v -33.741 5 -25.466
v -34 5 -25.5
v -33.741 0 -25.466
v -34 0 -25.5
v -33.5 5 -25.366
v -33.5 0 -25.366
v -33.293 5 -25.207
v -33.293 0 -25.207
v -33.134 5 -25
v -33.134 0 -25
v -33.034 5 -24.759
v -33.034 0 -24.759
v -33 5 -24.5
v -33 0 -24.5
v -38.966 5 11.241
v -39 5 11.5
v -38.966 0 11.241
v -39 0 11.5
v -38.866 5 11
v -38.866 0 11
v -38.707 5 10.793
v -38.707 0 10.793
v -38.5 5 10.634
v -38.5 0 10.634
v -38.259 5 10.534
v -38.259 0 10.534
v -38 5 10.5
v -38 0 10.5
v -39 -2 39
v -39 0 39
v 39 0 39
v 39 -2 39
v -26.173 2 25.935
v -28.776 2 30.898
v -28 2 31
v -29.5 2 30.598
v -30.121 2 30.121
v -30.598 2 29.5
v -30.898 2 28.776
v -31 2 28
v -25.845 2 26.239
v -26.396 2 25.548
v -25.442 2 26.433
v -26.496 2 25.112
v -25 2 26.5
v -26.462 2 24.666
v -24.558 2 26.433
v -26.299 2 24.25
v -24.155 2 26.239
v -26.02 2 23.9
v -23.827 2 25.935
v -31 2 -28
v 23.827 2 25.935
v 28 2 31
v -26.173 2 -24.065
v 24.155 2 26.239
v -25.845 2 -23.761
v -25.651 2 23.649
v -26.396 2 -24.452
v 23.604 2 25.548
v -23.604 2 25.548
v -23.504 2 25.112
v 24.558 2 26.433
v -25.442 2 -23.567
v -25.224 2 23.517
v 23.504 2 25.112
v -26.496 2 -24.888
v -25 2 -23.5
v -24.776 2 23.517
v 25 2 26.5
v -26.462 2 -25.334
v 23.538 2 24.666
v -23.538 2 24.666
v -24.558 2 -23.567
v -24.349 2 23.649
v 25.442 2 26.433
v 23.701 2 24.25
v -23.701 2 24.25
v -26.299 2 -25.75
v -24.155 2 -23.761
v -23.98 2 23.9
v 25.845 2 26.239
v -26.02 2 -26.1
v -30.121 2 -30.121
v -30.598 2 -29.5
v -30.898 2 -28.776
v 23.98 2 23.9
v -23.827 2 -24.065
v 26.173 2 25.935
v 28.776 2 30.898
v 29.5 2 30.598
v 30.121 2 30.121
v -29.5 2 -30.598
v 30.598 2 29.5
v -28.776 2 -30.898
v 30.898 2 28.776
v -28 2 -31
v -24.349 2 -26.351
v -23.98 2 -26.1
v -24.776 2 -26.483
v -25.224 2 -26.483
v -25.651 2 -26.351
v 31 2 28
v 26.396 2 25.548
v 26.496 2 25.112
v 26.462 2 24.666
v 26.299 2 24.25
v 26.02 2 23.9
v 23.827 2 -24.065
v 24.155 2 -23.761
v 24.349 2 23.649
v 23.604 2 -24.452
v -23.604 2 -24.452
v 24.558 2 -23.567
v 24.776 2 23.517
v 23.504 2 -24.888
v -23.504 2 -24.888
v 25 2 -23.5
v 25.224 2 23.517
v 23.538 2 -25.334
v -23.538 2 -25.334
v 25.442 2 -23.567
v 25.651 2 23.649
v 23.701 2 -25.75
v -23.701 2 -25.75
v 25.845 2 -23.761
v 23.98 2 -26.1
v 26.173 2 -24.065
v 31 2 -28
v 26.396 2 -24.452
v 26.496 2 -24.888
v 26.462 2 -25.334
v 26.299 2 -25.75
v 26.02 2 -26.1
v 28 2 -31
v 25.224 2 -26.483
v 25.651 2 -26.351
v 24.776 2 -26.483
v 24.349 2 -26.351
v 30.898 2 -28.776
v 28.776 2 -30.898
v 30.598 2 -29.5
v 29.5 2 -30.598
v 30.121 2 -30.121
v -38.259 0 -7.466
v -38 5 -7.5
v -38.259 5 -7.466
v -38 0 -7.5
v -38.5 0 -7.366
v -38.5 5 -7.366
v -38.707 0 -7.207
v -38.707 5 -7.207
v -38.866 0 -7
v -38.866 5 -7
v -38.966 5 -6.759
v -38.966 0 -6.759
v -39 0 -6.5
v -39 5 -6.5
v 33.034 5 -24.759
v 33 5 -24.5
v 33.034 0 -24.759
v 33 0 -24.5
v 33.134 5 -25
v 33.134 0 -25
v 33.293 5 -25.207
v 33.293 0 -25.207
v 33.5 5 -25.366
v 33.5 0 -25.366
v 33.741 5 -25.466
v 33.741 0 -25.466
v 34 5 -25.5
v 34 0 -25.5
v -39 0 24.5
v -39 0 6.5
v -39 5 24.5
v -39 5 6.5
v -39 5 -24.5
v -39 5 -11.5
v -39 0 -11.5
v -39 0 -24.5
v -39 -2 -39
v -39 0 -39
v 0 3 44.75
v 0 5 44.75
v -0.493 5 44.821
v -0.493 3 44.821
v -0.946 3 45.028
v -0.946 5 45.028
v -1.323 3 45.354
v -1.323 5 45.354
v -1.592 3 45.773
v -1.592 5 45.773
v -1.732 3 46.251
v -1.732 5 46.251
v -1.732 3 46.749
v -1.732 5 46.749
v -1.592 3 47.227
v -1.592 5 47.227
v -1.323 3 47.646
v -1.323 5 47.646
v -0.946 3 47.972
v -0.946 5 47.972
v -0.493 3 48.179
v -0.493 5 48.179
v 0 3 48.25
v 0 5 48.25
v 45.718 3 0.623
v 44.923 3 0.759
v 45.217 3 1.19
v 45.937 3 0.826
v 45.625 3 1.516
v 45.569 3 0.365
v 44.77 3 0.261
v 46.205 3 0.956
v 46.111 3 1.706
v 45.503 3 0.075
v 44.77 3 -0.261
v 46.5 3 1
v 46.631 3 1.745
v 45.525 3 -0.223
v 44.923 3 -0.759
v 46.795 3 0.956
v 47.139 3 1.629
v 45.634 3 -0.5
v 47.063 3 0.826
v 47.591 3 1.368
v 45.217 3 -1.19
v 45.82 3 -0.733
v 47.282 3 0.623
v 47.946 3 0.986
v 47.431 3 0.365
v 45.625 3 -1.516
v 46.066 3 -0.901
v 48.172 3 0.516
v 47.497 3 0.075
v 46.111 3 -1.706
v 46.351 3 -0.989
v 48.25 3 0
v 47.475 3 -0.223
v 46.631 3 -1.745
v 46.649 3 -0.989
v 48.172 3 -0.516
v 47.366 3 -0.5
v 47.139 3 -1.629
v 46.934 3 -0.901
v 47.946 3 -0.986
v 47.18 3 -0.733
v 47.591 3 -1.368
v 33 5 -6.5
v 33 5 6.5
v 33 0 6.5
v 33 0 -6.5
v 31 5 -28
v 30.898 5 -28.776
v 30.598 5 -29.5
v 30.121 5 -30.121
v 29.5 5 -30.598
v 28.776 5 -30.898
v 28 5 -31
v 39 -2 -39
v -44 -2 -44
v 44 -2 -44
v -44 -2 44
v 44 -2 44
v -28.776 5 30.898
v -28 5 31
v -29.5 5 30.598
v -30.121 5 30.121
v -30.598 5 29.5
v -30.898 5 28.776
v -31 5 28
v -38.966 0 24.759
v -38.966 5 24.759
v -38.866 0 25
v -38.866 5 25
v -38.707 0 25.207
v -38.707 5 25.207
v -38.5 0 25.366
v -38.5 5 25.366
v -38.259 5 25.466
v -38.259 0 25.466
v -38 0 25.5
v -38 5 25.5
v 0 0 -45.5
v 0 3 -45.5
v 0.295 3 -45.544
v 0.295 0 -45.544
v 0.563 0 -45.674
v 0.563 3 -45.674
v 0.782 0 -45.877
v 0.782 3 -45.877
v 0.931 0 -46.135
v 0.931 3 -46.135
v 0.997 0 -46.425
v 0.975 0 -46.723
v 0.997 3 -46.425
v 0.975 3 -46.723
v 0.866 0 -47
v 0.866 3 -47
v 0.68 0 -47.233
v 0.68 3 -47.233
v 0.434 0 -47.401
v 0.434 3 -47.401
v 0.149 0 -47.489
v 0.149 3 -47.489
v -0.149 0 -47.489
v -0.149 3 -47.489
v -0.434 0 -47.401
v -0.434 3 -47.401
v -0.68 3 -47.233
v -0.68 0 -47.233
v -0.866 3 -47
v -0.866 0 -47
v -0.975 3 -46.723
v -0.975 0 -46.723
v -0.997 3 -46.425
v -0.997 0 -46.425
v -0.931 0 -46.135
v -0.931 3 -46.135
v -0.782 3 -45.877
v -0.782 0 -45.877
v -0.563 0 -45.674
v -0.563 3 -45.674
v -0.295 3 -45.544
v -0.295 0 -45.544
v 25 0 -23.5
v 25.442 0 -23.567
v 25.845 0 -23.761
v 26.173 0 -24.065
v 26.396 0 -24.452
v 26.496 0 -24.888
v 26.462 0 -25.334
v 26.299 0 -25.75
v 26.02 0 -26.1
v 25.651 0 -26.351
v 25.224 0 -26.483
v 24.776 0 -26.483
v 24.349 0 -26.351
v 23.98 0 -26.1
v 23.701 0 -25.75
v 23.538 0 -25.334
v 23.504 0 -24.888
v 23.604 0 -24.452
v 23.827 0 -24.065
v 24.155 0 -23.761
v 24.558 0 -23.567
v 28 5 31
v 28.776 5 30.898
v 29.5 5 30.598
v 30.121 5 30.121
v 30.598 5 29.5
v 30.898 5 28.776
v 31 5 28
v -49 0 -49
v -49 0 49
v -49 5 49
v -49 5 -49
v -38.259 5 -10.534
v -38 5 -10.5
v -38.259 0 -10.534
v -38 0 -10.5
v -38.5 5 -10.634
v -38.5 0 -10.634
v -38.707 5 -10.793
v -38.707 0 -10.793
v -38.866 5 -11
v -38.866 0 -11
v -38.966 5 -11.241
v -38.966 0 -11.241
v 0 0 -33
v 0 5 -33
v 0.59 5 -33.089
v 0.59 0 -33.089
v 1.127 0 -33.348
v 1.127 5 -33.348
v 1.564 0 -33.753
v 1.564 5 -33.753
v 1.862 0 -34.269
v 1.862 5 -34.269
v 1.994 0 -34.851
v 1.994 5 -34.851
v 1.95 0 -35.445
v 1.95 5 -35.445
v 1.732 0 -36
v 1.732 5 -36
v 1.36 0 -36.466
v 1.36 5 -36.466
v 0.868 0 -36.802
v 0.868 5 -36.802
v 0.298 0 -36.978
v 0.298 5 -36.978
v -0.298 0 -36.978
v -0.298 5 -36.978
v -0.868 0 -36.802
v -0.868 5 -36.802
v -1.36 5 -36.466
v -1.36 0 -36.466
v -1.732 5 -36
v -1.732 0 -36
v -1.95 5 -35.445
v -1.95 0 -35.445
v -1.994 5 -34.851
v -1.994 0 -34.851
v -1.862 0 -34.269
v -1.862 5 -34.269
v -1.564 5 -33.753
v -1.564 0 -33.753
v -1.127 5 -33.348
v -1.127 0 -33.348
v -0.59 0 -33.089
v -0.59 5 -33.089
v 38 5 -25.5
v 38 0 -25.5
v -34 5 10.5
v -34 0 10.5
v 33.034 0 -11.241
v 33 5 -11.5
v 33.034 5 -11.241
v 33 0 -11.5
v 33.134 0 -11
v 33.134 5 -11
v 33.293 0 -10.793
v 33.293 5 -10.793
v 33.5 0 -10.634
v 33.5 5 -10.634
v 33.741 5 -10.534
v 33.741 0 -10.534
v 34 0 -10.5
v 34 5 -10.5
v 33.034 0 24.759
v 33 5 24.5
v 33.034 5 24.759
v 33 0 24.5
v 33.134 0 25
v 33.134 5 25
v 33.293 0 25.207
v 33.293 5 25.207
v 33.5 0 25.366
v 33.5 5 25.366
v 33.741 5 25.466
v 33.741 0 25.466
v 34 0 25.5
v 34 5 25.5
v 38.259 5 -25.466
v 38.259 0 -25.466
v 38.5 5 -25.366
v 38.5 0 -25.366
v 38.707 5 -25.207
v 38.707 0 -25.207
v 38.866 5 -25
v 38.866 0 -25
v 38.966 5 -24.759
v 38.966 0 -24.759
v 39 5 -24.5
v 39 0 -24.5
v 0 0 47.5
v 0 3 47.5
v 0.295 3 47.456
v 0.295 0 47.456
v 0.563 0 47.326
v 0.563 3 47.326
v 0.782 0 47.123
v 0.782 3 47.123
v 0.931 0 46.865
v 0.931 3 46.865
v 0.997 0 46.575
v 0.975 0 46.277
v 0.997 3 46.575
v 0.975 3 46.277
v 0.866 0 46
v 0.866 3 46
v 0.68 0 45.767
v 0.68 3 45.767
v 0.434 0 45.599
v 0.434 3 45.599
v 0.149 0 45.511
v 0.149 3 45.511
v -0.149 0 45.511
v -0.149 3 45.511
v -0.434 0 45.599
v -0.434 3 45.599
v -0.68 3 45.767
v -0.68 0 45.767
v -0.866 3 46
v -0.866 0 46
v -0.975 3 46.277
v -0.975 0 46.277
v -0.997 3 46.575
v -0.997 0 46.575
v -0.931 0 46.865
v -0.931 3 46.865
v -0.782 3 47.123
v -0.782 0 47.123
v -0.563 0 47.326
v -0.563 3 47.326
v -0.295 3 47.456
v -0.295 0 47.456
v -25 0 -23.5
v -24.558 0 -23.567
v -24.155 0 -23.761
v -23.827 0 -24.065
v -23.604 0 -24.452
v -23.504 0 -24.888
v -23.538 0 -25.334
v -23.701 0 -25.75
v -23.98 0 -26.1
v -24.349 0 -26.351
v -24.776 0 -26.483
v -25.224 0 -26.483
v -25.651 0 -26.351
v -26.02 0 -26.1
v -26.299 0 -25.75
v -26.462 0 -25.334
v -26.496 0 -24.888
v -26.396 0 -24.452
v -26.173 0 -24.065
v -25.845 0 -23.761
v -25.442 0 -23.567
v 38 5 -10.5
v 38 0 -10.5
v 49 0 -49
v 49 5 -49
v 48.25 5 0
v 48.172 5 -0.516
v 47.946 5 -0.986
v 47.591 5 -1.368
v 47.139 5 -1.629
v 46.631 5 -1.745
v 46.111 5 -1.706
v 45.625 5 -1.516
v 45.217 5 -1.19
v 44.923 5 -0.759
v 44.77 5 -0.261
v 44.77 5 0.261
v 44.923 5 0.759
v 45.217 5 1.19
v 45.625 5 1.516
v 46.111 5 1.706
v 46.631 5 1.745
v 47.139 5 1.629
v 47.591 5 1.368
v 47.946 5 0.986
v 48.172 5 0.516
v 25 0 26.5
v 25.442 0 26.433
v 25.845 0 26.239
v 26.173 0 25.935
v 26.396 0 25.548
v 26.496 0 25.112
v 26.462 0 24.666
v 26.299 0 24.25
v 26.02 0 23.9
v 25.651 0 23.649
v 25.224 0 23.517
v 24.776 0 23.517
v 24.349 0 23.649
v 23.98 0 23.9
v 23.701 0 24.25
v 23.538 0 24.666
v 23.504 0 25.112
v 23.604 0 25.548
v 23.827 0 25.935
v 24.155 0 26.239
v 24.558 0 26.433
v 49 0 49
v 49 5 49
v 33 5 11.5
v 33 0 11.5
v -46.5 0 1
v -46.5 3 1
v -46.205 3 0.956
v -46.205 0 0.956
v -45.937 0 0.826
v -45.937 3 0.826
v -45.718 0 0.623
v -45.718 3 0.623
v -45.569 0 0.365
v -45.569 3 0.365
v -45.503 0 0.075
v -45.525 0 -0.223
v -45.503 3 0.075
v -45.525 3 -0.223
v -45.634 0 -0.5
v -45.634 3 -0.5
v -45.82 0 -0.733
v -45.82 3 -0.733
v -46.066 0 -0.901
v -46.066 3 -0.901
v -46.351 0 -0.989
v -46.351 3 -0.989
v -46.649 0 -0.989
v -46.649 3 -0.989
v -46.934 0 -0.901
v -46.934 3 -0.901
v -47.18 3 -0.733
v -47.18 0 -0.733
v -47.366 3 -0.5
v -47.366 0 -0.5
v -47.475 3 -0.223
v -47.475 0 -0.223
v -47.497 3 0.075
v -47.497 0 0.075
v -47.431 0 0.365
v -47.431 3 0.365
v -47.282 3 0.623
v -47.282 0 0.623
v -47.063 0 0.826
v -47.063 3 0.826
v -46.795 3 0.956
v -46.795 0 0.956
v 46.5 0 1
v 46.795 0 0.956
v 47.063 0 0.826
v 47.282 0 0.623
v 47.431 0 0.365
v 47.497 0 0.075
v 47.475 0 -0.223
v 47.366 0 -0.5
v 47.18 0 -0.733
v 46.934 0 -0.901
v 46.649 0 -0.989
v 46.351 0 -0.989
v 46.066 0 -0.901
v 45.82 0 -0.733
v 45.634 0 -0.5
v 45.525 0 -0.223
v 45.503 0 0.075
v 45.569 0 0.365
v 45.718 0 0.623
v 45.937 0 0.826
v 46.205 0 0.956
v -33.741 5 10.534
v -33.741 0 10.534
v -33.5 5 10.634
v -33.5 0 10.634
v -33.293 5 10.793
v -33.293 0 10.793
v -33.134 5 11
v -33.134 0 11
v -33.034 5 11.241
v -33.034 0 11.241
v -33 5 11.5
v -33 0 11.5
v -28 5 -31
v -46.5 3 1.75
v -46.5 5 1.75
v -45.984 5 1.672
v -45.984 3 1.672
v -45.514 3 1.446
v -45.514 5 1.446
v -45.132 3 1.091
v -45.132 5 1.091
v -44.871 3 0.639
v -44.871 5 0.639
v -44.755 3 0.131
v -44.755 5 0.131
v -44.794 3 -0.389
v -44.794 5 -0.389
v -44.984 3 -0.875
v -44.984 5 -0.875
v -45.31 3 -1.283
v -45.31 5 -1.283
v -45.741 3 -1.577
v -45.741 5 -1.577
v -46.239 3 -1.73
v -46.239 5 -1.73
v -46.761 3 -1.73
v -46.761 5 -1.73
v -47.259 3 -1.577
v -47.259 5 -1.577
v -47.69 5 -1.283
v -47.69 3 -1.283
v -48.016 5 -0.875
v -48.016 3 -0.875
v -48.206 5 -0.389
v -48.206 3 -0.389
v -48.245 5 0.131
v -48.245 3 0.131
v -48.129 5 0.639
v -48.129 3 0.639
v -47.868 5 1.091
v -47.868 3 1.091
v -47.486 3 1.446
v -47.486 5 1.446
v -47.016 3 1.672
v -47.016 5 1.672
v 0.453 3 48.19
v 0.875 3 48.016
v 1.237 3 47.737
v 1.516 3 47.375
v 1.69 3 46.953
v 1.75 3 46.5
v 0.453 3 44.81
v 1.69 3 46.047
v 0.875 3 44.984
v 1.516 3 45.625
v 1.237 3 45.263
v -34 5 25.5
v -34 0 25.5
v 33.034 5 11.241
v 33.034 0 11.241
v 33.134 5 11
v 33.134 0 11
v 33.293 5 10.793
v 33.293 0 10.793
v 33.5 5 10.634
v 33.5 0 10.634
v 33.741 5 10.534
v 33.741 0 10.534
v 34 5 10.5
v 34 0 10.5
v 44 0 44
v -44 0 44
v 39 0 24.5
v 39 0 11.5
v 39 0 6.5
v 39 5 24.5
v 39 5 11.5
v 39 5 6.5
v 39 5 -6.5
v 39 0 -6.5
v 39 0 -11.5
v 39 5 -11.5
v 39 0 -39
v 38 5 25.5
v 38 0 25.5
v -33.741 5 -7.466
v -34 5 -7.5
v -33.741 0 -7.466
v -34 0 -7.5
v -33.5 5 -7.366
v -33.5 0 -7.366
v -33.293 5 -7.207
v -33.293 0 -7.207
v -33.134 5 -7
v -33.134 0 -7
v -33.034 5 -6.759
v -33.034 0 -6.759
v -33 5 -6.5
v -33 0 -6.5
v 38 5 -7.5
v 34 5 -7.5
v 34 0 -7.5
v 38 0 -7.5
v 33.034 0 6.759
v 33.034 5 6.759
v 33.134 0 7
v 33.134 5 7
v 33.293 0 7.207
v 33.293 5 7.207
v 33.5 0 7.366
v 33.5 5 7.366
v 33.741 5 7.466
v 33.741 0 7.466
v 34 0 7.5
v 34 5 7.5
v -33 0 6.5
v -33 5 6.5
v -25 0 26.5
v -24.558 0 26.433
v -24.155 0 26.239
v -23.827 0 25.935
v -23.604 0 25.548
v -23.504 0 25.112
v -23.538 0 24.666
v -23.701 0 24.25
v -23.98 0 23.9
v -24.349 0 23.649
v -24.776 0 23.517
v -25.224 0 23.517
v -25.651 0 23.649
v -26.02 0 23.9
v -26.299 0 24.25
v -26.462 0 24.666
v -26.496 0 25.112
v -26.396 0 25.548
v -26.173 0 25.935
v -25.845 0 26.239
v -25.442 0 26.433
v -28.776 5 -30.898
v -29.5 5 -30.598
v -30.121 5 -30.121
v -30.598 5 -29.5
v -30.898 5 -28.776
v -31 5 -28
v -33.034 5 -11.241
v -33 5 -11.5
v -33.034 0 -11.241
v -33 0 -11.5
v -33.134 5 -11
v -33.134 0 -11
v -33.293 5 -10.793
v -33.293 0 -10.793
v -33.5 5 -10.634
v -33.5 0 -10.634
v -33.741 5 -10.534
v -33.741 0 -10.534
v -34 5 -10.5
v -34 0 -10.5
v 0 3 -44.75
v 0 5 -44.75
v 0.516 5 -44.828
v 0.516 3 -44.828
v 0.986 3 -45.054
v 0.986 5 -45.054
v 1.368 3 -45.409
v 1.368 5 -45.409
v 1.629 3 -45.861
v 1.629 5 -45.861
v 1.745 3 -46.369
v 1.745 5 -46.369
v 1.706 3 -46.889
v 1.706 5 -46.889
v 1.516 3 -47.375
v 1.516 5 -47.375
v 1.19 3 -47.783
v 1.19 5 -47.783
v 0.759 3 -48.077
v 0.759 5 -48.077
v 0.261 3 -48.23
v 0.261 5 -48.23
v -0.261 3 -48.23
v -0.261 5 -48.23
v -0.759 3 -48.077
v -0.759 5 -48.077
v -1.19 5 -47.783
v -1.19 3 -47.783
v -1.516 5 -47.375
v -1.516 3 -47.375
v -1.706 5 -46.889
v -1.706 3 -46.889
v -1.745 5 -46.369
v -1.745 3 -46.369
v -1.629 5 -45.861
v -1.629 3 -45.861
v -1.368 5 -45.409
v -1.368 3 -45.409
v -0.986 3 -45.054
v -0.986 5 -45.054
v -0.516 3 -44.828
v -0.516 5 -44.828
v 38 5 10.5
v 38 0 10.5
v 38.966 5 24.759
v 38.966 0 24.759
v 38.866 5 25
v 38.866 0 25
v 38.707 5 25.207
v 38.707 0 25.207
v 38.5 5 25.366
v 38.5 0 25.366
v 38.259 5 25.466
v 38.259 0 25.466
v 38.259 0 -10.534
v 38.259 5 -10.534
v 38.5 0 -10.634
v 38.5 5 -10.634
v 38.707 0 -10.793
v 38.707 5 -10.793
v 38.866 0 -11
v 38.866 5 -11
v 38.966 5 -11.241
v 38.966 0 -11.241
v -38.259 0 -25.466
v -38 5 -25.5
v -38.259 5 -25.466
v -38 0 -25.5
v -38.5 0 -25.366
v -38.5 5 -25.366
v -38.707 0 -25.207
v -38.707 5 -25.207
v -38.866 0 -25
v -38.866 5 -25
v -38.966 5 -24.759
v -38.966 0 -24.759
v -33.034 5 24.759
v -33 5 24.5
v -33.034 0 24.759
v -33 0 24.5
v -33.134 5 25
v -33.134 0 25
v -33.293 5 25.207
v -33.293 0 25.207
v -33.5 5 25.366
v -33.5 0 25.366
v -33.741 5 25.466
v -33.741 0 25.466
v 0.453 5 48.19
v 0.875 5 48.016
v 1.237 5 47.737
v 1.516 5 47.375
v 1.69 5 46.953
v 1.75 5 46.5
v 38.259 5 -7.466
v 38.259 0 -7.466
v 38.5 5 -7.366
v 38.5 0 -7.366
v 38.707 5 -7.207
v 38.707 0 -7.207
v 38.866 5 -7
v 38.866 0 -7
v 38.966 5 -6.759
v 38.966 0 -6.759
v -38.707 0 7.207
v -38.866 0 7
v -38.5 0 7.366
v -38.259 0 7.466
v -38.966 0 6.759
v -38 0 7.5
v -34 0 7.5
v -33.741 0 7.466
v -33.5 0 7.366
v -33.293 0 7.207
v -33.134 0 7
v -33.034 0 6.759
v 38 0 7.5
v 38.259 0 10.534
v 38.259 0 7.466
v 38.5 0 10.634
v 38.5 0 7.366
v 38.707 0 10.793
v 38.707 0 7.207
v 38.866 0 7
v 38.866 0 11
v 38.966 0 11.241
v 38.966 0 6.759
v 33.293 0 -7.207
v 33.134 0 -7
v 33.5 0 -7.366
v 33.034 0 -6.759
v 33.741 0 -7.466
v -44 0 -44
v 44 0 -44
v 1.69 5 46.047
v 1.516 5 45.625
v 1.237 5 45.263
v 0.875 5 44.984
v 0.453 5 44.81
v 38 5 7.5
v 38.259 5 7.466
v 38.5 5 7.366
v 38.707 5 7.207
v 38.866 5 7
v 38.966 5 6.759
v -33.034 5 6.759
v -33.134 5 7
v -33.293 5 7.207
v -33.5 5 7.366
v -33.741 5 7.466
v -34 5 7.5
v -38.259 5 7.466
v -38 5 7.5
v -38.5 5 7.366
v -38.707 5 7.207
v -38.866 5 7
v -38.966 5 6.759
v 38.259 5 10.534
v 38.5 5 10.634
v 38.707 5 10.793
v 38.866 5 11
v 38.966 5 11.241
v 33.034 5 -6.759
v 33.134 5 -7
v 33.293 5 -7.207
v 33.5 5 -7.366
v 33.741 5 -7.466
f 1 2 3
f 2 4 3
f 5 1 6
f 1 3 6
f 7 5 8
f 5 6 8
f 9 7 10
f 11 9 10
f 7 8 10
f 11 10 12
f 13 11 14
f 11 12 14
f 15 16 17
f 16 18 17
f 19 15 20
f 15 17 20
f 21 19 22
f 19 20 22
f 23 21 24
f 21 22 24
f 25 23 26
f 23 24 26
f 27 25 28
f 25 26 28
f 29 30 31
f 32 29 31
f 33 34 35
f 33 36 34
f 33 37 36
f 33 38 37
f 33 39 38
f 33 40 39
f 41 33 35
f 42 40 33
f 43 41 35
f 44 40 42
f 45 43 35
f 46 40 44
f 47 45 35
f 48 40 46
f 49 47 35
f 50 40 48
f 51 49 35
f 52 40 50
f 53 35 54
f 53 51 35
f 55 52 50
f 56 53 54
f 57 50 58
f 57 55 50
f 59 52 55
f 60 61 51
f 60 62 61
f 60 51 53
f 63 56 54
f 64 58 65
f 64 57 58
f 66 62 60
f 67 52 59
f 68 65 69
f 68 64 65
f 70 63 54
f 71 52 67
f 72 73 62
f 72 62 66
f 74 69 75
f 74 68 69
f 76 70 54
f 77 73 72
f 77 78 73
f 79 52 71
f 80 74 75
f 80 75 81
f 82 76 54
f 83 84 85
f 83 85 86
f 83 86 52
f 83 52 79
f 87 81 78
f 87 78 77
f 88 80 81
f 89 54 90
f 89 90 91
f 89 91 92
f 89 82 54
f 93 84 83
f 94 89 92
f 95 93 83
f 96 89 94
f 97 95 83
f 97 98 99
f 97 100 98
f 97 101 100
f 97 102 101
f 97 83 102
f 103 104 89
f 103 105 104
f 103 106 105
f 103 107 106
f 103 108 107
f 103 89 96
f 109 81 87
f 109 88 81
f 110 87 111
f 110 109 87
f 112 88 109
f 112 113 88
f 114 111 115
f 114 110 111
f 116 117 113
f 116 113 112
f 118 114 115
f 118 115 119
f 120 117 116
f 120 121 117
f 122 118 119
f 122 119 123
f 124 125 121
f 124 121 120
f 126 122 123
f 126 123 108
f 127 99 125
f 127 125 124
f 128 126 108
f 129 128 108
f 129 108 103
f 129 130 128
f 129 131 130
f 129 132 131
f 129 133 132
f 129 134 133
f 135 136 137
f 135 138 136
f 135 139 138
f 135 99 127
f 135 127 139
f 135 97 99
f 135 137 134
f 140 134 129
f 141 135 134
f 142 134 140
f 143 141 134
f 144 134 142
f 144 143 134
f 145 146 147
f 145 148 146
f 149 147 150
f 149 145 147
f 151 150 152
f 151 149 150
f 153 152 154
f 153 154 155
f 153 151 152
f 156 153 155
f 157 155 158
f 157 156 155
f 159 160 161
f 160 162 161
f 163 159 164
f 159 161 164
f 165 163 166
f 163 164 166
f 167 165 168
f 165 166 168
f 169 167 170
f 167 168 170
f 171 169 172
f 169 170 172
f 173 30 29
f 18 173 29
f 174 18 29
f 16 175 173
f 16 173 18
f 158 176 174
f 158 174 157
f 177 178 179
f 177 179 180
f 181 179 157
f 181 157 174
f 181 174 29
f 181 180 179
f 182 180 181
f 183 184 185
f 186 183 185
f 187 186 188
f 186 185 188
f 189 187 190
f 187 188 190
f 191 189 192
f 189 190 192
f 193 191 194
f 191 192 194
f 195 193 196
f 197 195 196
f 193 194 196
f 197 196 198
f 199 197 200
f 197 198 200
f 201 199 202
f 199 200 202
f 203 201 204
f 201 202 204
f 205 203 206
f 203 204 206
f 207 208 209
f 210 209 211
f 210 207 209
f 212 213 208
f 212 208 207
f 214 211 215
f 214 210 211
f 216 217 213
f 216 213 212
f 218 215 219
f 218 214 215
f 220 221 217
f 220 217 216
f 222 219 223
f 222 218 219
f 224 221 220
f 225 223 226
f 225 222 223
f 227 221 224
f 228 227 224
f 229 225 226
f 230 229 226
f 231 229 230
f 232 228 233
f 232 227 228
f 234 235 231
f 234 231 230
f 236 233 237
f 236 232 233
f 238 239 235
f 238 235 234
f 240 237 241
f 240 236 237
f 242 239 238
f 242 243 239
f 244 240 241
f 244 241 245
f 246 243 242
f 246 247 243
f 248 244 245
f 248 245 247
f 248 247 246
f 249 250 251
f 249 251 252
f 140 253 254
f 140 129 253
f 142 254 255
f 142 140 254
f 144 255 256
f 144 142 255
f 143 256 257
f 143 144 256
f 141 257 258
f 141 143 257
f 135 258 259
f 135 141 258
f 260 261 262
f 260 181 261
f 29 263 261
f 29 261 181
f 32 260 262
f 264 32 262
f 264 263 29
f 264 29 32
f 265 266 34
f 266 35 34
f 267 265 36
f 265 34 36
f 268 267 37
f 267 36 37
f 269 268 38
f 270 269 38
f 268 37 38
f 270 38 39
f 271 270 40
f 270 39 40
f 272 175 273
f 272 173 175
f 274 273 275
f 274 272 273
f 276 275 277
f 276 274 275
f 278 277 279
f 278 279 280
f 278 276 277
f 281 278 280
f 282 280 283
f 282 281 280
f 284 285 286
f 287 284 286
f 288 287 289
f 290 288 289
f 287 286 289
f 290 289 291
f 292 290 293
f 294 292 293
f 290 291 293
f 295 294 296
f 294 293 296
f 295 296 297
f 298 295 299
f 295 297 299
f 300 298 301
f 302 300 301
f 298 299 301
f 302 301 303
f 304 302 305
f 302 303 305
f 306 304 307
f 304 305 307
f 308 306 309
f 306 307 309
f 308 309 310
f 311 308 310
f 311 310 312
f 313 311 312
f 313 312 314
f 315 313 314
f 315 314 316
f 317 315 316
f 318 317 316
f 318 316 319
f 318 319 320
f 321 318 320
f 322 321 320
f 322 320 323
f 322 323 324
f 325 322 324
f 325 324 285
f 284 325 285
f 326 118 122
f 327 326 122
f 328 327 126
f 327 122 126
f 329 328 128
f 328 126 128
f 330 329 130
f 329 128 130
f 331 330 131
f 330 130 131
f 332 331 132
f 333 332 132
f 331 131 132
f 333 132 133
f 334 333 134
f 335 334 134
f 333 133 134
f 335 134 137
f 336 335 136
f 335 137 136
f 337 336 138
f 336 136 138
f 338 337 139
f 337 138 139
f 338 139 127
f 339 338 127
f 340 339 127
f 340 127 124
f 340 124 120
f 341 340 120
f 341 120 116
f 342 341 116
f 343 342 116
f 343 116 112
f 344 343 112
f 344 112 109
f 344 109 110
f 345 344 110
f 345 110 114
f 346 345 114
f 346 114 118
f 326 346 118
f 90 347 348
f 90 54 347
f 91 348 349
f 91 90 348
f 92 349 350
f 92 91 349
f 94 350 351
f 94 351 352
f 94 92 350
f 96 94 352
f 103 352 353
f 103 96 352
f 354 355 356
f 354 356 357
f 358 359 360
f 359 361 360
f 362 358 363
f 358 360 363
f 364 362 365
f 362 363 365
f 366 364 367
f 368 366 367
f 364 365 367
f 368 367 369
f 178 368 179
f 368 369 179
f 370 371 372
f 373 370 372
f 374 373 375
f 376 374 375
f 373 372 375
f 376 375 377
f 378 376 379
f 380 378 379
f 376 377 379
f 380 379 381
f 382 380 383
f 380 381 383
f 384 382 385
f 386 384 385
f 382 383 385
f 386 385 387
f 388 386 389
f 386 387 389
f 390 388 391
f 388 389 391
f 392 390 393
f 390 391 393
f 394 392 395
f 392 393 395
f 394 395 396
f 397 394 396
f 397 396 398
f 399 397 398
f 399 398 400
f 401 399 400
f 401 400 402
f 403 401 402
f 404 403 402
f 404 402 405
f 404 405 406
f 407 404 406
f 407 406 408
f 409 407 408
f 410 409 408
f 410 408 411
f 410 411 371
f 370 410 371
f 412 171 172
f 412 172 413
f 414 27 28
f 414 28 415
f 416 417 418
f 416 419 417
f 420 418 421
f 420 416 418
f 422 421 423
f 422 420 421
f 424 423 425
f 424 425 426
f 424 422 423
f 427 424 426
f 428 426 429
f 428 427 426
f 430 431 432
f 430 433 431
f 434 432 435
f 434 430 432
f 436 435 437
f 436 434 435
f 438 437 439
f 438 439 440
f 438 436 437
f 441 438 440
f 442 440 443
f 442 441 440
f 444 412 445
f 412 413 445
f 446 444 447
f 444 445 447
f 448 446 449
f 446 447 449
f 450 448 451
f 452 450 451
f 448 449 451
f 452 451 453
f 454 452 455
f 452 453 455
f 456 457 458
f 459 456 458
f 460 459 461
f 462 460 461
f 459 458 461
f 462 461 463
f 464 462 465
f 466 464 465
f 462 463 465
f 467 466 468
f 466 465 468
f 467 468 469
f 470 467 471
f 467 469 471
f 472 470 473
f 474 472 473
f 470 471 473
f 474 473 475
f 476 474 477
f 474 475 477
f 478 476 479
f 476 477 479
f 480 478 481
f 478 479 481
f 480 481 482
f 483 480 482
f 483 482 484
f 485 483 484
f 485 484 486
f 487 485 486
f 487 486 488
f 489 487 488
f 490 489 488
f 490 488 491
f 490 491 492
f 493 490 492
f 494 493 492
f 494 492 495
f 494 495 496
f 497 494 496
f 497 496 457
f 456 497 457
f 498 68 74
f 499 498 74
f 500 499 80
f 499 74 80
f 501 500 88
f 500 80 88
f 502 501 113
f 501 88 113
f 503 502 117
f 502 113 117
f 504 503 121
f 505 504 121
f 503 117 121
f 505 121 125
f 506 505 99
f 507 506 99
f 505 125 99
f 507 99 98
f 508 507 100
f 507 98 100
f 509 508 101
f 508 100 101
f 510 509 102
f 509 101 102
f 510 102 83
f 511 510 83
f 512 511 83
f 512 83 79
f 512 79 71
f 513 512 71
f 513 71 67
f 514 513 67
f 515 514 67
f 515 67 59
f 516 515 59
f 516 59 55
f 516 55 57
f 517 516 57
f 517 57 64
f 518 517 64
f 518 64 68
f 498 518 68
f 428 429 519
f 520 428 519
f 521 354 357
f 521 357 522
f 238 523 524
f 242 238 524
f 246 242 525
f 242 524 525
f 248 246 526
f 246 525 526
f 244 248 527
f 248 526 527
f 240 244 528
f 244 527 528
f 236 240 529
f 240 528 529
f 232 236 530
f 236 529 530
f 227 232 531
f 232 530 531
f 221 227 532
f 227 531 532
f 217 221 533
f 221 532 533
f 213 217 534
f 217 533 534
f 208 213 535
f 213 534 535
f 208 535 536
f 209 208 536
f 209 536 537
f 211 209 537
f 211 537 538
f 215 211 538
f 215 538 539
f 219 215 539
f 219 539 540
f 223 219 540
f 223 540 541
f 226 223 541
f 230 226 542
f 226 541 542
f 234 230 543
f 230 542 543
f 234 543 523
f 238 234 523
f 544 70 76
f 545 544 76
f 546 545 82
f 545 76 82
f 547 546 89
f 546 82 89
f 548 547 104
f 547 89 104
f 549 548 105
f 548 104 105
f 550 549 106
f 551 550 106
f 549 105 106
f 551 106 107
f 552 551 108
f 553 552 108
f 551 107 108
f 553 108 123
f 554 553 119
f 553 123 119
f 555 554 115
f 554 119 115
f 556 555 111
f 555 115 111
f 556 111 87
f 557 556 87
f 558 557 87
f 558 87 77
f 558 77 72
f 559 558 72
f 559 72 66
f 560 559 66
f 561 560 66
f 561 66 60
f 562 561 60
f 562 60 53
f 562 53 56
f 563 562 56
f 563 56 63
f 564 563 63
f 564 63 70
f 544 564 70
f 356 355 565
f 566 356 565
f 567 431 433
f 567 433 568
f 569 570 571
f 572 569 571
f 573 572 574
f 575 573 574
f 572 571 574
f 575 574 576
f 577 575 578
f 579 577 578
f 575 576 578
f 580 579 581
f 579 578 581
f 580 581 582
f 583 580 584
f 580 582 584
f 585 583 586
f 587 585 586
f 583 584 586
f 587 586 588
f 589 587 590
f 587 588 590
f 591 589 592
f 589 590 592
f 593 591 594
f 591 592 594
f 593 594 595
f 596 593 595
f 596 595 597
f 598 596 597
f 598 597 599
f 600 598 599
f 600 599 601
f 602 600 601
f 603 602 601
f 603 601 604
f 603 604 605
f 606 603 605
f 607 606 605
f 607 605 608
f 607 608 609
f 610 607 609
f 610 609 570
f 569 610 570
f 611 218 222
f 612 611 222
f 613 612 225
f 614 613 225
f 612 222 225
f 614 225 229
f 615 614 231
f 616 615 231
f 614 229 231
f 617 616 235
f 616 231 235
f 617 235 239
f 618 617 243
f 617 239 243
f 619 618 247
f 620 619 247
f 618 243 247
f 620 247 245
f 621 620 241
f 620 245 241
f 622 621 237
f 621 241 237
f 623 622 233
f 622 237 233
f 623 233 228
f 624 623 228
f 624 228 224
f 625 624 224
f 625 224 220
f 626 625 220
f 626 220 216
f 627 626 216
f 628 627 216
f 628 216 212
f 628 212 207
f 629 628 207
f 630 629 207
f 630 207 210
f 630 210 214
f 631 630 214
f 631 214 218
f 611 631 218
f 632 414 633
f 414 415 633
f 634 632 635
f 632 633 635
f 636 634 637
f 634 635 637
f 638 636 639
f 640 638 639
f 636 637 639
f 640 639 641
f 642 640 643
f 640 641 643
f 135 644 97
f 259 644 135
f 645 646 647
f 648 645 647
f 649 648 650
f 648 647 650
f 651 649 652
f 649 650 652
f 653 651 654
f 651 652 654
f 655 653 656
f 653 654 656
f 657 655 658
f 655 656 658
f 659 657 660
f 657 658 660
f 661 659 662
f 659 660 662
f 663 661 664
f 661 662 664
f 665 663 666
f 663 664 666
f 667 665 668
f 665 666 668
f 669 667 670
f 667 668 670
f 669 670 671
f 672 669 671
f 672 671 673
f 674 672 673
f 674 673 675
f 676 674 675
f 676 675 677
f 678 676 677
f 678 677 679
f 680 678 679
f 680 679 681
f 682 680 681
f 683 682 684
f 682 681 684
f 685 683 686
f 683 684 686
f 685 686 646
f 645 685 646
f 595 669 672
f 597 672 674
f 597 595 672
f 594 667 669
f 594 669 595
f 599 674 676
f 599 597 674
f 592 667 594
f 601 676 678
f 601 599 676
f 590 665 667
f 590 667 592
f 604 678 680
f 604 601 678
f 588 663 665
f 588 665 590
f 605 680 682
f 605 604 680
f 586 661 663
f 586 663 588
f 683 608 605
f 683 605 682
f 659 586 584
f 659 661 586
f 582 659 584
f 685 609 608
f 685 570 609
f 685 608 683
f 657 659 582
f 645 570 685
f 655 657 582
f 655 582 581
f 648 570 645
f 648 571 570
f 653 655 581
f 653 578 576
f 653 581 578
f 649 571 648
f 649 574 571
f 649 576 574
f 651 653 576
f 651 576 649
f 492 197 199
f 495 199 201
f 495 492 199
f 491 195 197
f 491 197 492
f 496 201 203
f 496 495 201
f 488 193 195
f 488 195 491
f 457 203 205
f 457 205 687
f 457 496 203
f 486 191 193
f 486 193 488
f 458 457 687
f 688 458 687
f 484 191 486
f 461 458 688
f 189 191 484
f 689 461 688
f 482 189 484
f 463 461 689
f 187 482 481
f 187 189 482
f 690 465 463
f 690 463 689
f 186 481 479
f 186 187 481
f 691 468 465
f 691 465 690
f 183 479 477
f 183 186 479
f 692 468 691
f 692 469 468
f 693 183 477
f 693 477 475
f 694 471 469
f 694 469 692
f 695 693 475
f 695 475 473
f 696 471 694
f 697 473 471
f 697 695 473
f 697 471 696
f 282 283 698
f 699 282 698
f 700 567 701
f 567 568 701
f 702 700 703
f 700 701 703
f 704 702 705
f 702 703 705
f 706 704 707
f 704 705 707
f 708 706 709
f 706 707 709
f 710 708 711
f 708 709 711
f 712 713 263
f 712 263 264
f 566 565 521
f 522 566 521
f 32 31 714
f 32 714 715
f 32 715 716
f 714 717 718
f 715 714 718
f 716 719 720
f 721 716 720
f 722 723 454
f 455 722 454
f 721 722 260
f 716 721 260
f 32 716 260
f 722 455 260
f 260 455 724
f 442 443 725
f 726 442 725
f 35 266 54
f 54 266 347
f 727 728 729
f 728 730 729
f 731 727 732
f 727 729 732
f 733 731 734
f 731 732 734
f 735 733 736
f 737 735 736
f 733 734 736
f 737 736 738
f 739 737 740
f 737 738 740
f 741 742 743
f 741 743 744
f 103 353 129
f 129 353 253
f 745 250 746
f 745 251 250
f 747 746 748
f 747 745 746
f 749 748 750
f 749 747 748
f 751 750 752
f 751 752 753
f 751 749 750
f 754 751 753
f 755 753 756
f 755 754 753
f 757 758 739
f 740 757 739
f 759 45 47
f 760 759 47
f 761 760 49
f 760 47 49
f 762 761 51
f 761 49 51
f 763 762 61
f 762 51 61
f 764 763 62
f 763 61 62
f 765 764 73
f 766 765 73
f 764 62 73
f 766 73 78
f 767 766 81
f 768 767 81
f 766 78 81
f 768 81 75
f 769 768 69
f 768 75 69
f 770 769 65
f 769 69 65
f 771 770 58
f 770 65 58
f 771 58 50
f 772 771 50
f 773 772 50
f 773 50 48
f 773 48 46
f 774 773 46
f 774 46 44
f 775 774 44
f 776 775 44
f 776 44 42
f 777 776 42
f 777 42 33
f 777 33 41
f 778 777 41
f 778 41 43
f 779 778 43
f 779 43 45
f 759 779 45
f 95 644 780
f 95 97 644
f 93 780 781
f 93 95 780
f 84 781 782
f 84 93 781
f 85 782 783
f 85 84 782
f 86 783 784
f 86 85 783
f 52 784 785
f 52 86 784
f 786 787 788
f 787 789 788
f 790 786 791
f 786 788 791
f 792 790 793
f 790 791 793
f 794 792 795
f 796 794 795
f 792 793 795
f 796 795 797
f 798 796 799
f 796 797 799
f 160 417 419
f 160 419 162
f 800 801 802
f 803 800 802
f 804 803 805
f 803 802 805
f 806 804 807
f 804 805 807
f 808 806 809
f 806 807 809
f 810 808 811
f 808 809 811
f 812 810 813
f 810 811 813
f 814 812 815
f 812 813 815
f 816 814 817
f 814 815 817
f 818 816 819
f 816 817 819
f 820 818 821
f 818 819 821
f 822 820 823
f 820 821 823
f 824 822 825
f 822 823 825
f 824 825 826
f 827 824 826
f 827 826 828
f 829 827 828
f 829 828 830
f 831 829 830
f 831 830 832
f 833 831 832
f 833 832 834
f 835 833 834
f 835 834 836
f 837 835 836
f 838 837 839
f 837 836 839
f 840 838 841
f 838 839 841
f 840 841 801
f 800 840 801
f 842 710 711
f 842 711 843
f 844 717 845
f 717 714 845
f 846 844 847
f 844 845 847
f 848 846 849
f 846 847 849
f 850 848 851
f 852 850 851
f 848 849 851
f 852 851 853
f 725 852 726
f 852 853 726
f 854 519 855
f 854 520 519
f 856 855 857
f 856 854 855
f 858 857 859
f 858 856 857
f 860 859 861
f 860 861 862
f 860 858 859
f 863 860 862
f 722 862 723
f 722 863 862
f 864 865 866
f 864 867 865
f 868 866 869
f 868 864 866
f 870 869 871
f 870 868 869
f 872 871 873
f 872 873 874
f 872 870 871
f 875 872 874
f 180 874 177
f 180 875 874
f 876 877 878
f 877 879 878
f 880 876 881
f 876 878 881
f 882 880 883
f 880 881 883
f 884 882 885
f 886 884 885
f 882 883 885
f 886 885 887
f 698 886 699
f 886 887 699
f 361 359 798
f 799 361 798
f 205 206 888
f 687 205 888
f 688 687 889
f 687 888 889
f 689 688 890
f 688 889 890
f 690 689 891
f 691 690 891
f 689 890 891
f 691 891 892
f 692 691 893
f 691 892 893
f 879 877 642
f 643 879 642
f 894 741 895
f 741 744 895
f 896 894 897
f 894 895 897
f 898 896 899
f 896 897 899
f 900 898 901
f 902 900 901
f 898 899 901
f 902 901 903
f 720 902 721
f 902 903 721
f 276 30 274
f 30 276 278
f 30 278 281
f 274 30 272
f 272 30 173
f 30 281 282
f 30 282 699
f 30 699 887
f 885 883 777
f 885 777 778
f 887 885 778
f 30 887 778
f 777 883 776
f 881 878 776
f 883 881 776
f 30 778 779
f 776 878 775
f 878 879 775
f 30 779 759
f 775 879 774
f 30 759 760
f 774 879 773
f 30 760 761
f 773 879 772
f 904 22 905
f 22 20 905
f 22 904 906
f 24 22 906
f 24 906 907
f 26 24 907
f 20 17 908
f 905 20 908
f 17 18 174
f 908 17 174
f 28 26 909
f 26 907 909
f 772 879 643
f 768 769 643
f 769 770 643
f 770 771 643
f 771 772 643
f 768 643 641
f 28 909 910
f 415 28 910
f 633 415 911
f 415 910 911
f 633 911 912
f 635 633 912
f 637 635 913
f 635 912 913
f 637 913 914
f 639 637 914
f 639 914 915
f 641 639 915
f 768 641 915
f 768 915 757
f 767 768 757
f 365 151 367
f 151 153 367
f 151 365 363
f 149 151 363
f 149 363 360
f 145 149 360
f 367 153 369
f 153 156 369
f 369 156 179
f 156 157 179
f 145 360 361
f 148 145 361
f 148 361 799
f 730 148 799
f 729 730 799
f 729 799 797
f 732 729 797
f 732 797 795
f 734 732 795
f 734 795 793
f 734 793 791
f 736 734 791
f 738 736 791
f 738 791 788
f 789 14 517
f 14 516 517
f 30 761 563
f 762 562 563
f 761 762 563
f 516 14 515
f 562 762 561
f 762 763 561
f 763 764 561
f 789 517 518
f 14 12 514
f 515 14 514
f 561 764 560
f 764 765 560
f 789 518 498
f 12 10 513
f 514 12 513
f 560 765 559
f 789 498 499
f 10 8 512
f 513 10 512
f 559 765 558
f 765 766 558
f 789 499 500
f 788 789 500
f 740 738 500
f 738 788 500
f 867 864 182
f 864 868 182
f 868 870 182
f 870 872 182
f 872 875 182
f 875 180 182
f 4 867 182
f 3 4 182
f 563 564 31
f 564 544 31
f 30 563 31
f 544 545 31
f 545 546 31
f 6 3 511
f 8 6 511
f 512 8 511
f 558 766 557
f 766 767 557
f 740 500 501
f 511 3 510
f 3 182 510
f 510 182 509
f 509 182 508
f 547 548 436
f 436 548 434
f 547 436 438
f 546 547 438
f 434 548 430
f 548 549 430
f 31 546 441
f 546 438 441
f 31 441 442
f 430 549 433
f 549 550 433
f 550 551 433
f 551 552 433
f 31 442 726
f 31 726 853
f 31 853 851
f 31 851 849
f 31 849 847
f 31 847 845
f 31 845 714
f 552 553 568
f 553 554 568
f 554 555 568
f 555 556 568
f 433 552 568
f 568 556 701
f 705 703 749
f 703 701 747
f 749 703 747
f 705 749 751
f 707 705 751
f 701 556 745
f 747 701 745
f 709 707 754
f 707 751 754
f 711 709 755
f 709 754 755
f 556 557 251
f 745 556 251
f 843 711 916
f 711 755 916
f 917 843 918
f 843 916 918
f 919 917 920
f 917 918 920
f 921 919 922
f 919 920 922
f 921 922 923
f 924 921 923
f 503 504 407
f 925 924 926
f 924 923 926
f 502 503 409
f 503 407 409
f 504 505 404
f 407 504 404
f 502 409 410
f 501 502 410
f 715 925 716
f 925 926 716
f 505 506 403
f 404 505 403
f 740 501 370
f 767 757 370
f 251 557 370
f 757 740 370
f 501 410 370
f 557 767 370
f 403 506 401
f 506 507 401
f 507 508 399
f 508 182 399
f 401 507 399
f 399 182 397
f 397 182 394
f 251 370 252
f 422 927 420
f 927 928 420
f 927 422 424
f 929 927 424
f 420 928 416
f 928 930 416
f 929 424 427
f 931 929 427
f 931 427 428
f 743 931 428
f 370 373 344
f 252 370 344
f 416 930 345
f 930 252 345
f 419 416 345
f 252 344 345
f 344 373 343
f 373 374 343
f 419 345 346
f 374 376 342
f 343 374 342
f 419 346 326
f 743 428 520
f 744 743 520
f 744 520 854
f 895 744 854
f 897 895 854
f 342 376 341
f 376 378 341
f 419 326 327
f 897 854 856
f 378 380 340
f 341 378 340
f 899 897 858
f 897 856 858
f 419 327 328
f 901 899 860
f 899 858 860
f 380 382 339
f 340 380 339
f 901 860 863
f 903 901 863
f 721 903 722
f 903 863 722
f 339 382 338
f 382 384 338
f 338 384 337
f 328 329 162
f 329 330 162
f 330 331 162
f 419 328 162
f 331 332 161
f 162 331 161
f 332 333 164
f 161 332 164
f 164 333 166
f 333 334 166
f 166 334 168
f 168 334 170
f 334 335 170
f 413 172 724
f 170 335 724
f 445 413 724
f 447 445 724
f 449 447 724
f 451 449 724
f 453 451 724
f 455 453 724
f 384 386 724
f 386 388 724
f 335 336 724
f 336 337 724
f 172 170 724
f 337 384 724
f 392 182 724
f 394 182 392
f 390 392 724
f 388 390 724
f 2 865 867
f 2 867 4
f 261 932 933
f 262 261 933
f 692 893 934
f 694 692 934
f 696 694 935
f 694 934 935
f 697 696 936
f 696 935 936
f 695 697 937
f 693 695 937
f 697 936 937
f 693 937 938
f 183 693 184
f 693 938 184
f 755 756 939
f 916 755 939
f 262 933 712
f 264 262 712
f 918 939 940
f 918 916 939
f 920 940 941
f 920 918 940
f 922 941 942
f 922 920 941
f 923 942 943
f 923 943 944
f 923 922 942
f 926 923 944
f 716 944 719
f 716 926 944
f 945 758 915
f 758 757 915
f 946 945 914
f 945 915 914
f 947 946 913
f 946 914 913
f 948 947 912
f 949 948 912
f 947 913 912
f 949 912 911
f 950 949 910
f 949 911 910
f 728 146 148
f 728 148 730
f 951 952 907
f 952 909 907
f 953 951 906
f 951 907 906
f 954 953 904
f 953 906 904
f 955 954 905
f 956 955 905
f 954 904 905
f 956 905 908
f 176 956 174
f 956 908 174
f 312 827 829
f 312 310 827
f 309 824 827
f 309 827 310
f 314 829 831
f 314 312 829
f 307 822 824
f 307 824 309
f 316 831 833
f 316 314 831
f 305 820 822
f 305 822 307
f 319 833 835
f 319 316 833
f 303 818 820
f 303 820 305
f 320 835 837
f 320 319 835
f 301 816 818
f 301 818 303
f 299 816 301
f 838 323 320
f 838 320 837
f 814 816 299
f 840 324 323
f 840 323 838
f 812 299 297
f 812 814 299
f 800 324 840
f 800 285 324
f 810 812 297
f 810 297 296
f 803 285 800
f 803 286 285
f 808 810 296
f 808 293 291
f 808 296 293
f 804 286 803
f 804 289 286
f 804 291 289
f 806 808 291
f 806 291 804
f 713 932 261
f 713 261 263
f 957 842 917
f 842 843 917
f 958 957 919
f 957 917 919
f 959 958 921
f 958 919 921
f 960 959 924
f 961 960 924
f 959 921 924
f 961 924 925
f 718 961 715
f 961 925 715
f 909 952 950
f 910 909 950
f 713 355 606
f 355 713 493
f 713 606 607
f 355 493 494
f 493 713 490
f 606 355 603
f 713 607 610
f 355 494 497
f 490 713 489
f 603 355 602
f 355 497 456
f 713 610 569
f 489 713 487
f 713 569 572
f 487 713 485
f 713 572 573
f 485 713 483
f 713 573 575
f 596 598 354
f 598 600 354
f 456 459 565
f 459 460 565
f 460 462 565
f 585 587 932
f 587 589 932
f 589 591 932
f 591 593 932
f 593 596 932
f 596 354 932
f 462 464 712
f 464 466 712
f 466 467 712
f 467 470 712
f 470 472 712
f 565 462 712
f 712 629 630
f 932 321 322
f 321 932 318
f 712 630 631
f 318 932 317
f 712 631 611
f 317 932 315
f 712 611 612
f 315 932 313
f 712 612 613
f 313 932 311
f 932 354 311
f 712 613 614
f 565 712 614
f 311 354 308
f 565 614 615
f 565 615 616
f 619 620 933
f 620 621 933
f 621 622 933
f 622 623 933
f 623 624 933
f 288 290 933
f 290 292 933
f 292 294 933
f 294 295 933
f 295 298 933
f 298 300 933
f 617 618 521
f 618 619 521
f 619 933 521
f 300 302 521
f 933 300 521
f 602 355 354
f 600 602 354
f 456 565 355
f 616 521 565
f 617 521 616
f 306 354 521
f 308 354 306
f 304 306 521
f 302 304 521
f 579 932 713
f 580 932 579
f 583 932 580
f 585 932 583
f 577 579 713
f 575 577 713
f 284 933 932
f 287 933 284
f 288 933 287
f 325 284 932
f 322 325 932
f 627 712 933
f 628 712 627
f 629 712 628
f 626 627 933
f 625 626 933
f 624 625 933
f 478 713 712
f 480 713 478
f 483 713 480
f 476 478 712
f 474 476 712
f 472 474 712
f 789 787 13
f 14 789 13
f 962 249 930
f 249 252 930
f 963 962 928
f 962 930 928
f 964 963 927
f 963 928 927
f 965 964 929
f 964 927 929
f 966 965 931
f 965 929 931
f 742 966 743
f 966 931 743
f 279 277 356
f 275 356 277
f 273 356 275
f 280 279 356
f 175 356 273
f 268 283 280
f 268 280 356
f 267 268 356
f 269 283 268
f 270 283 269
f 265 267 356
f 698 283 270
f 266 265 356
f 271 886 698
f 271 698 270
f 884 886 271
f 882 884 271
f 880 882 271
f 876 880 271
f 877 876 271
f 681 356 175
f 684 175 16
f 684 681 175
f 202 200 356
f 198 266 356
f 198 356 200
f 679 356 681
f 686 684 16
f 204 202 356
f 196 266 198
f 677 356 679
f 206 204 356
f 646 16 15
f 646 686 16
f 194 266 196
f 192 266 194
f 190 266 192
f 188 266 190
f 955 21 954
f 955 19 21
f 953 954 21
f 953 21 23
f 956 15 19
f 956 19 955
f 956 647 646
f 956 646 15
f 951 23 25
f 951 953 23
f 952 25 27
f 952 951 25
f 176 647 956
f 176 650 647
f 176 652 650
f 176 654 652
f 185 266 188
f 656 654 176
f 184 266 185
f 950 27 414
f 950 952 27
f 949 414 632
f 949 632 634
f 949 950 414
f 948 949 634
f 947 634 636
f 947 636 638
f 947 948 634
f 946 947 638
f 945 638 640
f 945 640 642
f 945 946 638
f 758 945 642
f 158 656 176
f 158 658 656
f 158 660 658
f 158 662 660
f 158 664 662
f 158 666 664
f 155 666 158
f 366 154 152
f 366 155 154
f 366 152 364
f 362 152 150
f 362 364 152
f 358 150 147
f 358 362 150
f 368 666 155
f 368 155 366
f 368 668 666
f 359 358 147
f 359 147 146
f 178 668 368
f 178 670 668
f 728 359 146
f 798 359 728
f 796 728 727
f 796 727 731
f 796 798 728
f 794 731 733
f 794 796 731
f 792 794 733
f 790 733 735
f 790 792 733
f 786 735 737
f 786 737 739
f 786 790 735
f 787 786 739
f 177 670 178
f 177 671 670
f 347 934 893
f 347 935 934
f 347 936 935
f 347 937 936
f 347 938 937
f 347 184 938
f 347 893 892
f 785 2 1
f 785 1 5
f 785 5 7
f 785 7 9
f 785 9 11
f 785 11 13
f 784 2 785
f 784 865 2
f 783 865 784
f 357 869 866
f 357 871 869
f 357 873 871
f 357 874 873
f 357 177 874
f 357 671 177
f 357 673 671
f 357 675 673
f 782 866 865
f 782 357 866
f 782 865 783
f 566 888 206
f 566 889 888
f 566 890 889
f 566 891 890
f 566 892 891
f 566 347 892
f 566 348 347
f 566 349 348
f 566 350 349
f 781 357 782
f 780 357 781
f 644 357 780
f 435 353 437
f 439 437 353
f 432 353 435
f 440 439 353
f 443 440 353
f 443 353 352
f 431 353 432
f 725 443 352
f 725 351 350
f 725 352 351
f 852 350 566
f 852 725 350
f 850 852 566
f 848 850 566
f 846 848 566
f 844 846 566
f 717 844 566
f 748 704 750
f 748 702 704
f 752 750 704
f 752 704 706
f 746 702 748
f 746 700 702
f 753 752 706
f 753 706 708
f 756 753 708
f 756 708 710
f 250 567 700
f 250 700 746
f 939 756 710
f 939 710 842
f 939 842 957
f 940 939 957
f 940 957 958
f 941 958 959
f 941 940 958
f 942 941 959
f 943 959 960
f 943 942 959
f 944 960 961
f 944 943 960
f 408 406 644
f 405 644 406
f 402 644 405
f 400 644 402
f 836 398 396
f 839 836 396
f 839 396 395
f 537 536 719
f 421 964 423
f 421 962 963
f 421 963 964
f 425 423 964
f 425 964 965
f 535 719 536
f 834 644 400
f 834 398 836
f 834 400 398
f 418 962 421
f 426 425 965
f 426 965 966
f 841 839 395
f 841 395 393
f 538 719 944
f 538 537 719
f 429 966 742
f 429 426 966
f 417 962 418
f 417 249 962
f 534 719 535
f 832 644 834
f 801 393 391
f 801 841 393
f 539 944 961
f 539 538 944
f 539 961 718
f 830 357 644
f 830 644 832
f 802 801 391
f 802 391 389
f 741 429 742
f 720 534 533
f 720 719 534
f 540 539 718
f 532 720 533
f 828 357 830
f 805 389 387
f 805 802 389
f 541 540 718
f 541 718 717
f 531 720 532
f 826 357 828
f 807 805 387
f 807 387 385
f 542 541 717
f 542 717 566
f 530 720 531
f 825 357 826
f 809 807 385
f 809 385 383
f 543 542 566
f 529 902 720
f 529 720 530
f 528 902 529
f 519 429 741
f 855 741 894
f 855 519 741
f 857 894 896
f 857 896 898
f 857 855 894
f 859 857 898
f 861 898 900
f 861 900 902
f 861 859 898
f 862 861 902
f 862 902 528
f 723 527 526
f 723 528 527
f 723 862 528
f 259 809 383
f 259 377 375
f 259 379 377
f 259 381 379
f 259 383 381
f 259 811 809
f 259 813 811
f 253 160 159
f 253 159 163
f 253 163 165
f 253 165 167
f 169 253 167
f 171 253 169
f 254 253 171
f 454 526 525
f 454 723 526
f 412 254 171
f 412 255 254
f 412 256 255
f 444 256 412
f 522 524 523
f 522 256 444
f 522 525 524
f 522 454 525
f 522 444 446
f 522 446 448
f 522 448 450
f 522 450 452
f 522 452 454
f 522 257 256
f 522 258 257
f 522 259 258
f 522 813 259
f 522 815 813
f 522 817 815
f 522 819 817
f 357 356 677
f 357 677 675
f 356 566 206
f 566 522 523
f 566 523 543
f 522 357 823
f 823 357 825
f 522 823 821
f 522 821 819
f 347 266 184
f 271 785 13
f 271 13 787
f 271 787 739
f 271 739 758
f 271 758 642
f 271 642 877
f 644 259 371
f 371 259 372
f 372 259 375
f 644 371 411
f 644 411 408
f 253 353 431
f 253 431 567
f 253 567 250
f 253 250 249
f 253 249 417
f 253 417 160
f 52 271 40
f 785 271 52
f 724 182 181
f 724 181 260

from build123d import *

# Parameters (mm, degrees)
SKETCH1_W           = 98
SKETCH1_H           = 98
BOSS_EXTRUDE2_DEPTH = 5
SKETCH12_W          = 88
SKETCH12_H          = 88
SKETCH12_W_2        = 78
SKETCH12_H_2        = 78
BOSS_EXTRUDE4_DEPTH = 2
SKETCH13_R          = 1.75
CUT_EXTRUDE13_DEPTH = 2
SKETCH14_R          = 1
CUT_EXTRUDE14_DEPTH = 9
SKETCH16_W          = 62
SKETCH16_H          = 62
CUT_EXTRUDE15_DEPTH = 3
FILLET1_R           = 3
SKETCH17_R          = 1.5
CUT_EXTRUDE16_DEPTH = 3
SKETCH23_W          = 6
SKETCH23_H          = 15
CUT_EXTRUDE19_DEPTH = 12
FILLET2_R           = 1
SKETCH24_R          = 2
CUT_EXTRUDE22_DEPTH = 12


with BuildPart() as part:
    # Sketch1 → Boss-Extrude2 (new body)
    with BuildSketch(Plane(origin=(0, 0, 0), x_dir=(1, 0, 0), z_dir=(0, 1, 0))):
        Rectangle(SKETCH1_W, SKETCH1_H)
    extrude(amount=BOSS_EXTRUDE2_DEPTH)

    # Sketch12 → Boss-Extrude4 (add)
    with BuildSketch(Plane.XZ):
        Rectangle(SKETCH12_W, SKETCH12_H)
        Rectangle(SKETCH12_W_2, SKETCH12_H_2, mode=Mode.SUBTRACT)
    extrude(amount=BOSS_EXTRUDE4_DEPTH)

    # Sketch13 → Cut-Extrude13 (cut)
    with BuildSketch(Plane(origin=(0, 5, 0), x_dir=(1, 0, 0), z_dir=(0, 1, 0))):
        with BuildLine():
            ThreePointArc((0, -44.75), (-1.75, -46.5), (0, -48.25))
            Line((0, -48.25), (0, -44.75))
        make_face()
        with BuildLine():
            Line((0, -44.75), (0, -48.25))
            ThreePointArc((0, -48.25), (1.237436867, -47.737436867), (1.75, -46.5))
            ThreePointArc((1.75, -46.5), (1.237436867, -45.262563133), (0, -44.75))
        make_face()
        with Locations(Location((-46.5, 0, 0), (0, 0, 270))):
            Circle(SKETCH13_R)
        with Locations(Location((0, 46.5, 0), (0, 0, 270))):
            Circle(SKETCH13_R)
        with BuildLine():
            ThreePointArc((44.75, 0), (46.5, -1.75), (48.25, 0))
            Line((48.25, 0), (44.75, 0))
        make_face()
        with BuildLine():
            Line((44.75, 0), (48.25, 0))
            ThreePointArc((48.25, 0), (46.5, 1.75), (44.75, 0))
        make_face()
    extrude(amount=-CUT_EXTRUDE13_DEPTH, mode=Mode.SUBTRACT)

    # Sketch14 → Cut-Extrude14 (cut)
    with BuildSketch(Plane(origin=(0, 5, 0), x_dir=(1, 0, 0), z_dir=(0, 1, 0))):
        with Locations(Location((0, -46.5, 0), (0, 0, 270))):
            Circle(SKETCH14_R)
        with Locations(Location((-46.5, 0, 0), (0, 0, 270))):
            Circle(SKETCH14_R)
        with Locations(Location((46.5, 0, 0), (0, 0, 270))):
            Circle(SKETCH14_R)
        with Locations(Location((0, 46.5, 0), (0, 0, 270))):
            Circle(SKETCH14_R)
    extrude(amount=-CUT_EXTRUDE14_DEPTH, mode=Mode.SUBTRACT)

    # Sketch16 → Cut-Extrude15 (cut)
    with BuildSketch(Plane(origin=(0, 5, 0), x_dir=(1, 0, 0), z_dir=(0, 1, 0))):
        Rectangle(SKETCH16_W, SKETCH16_H)
    extrude(amount=-CUT_EXTRUDE15_DEPTH, mode=Mode.SUBTRACT)

    # Fillet1
    fillet1_edges = [part.edges().sort_by_distance(p)[0] for p in [
        (31, 3.5, -31),
        (31, 3.5, 31),
        (-31, 3.5, 31),
        (-31, 3.5, -31),
    ]]
    fillet(fillet1_edges, radius=FILLET1_R)

    # Sketch17 → Cut-Extrude16 (cut)
    with BuildSketch(Plane(origin=(0, 2, 0), x_dir=(1, 0, 0), z_dir=(0, 1, 0))):
        with Locations(Location((25, 25, 0), (0, 0, 270))):
            Circle(SKETCH17_R)
        with Locations(Location((25, -25, 0), (0, 0, 270))):
            Circle(SKETCH17_R)
        with Locations(Location((-25, 25, 0), (0, 0, 270))):
            Circle(SKETCH17_R)
        with Locations(Location((-25, -25, 0), (0, 0, 270))):
            Circle(SKETCH17_R)
    extrude(amount=-CUT_EXTRUDE16_DEPTH, mode=Mode.SUBTRACT)

    # Sketch23 → Cut-Extrude19 (cut)
    with BuildSketch(Plane(origin=(0, 5, 0), x_dir=(1, 0, 0), z_dir=(0, 1, 0))):
        with Locations((36, 18)):
            Rectangle(SKETCH23_W, SKETCH23_H)
        with Locations((36, 0)):
            Rectangle(SKETCH23_W, SKETCH23_H)
        with Locations((36, -18)):
            Rectangle(SKETCH23_W, SKETCH23_H)
        with Locations((-36, 18)):
            Rectangle(SKETCH23_W, SKETCH23_H)
        with Locations((-36, 0)):
            Rectangle(SKETCH23_W, SKETCH23_H)
        with Locations((-36, -18)):
            Rectangle(SKETCH23_W, SKETCH23_H)
    extrude(amount=-CUT_EXTRUDE19_DEPTH, mode=Mode.SUBTRACT)

    # Fillet2
    fillet2_edges = [part.edges().sort_by_distance(p)[0] for p in [
        (39, 2.5, 7.5),
        (33, 2.5, 7.5),
        (33, 2.5, -7.5),
        (39, 2.5, -7.5),
        (39, 2.5, 10.5),
        (39, 2.5, 25.5),
        (33, 2.5, 25.5),
        (33, 2.5, 10.5),
        (-33, 2.5, -25.5),
        (-33, 2.5, -10.5),
        (-39, 2.5, -10.5),
        (-39, 2.5, -25.5),
        (-33, 2.5, -7.5),
        (-33, 2.5, 7.5),
        (-39, 2.5, 7.5),
        (-39, 2.5, -7.5),
        (-39, 2.5, 10.5),
        (-33, 2.5, 10.5),
        (-33, 2.5, 25.5),
        (-39, 2.5, 25.5),
        (39, 2.5, -25.5),
        (39, 2.5, -10.5),
        (33, 2.5, -10.5),
        (33, 2.5, -25.5),
    ]]
    fillet(fillet2_edges, radius=FILLET2_R)

    # Sketch24 → Cut-Extrude22 (cut)
    with BuildSketch(Plane(origin=(0, 5, 0), x_dir=(1, 0, 0), z_dir=(0, 1, 0))):
        with Locations(Location((0, 35, 0), (0, 0, 270))):
            Circle(SKETCH24_R)
    extrude(amount=-CUT_EXTRUDE22_DEPTH, mode=Mode.SUBTRACT)


solid = part.part
